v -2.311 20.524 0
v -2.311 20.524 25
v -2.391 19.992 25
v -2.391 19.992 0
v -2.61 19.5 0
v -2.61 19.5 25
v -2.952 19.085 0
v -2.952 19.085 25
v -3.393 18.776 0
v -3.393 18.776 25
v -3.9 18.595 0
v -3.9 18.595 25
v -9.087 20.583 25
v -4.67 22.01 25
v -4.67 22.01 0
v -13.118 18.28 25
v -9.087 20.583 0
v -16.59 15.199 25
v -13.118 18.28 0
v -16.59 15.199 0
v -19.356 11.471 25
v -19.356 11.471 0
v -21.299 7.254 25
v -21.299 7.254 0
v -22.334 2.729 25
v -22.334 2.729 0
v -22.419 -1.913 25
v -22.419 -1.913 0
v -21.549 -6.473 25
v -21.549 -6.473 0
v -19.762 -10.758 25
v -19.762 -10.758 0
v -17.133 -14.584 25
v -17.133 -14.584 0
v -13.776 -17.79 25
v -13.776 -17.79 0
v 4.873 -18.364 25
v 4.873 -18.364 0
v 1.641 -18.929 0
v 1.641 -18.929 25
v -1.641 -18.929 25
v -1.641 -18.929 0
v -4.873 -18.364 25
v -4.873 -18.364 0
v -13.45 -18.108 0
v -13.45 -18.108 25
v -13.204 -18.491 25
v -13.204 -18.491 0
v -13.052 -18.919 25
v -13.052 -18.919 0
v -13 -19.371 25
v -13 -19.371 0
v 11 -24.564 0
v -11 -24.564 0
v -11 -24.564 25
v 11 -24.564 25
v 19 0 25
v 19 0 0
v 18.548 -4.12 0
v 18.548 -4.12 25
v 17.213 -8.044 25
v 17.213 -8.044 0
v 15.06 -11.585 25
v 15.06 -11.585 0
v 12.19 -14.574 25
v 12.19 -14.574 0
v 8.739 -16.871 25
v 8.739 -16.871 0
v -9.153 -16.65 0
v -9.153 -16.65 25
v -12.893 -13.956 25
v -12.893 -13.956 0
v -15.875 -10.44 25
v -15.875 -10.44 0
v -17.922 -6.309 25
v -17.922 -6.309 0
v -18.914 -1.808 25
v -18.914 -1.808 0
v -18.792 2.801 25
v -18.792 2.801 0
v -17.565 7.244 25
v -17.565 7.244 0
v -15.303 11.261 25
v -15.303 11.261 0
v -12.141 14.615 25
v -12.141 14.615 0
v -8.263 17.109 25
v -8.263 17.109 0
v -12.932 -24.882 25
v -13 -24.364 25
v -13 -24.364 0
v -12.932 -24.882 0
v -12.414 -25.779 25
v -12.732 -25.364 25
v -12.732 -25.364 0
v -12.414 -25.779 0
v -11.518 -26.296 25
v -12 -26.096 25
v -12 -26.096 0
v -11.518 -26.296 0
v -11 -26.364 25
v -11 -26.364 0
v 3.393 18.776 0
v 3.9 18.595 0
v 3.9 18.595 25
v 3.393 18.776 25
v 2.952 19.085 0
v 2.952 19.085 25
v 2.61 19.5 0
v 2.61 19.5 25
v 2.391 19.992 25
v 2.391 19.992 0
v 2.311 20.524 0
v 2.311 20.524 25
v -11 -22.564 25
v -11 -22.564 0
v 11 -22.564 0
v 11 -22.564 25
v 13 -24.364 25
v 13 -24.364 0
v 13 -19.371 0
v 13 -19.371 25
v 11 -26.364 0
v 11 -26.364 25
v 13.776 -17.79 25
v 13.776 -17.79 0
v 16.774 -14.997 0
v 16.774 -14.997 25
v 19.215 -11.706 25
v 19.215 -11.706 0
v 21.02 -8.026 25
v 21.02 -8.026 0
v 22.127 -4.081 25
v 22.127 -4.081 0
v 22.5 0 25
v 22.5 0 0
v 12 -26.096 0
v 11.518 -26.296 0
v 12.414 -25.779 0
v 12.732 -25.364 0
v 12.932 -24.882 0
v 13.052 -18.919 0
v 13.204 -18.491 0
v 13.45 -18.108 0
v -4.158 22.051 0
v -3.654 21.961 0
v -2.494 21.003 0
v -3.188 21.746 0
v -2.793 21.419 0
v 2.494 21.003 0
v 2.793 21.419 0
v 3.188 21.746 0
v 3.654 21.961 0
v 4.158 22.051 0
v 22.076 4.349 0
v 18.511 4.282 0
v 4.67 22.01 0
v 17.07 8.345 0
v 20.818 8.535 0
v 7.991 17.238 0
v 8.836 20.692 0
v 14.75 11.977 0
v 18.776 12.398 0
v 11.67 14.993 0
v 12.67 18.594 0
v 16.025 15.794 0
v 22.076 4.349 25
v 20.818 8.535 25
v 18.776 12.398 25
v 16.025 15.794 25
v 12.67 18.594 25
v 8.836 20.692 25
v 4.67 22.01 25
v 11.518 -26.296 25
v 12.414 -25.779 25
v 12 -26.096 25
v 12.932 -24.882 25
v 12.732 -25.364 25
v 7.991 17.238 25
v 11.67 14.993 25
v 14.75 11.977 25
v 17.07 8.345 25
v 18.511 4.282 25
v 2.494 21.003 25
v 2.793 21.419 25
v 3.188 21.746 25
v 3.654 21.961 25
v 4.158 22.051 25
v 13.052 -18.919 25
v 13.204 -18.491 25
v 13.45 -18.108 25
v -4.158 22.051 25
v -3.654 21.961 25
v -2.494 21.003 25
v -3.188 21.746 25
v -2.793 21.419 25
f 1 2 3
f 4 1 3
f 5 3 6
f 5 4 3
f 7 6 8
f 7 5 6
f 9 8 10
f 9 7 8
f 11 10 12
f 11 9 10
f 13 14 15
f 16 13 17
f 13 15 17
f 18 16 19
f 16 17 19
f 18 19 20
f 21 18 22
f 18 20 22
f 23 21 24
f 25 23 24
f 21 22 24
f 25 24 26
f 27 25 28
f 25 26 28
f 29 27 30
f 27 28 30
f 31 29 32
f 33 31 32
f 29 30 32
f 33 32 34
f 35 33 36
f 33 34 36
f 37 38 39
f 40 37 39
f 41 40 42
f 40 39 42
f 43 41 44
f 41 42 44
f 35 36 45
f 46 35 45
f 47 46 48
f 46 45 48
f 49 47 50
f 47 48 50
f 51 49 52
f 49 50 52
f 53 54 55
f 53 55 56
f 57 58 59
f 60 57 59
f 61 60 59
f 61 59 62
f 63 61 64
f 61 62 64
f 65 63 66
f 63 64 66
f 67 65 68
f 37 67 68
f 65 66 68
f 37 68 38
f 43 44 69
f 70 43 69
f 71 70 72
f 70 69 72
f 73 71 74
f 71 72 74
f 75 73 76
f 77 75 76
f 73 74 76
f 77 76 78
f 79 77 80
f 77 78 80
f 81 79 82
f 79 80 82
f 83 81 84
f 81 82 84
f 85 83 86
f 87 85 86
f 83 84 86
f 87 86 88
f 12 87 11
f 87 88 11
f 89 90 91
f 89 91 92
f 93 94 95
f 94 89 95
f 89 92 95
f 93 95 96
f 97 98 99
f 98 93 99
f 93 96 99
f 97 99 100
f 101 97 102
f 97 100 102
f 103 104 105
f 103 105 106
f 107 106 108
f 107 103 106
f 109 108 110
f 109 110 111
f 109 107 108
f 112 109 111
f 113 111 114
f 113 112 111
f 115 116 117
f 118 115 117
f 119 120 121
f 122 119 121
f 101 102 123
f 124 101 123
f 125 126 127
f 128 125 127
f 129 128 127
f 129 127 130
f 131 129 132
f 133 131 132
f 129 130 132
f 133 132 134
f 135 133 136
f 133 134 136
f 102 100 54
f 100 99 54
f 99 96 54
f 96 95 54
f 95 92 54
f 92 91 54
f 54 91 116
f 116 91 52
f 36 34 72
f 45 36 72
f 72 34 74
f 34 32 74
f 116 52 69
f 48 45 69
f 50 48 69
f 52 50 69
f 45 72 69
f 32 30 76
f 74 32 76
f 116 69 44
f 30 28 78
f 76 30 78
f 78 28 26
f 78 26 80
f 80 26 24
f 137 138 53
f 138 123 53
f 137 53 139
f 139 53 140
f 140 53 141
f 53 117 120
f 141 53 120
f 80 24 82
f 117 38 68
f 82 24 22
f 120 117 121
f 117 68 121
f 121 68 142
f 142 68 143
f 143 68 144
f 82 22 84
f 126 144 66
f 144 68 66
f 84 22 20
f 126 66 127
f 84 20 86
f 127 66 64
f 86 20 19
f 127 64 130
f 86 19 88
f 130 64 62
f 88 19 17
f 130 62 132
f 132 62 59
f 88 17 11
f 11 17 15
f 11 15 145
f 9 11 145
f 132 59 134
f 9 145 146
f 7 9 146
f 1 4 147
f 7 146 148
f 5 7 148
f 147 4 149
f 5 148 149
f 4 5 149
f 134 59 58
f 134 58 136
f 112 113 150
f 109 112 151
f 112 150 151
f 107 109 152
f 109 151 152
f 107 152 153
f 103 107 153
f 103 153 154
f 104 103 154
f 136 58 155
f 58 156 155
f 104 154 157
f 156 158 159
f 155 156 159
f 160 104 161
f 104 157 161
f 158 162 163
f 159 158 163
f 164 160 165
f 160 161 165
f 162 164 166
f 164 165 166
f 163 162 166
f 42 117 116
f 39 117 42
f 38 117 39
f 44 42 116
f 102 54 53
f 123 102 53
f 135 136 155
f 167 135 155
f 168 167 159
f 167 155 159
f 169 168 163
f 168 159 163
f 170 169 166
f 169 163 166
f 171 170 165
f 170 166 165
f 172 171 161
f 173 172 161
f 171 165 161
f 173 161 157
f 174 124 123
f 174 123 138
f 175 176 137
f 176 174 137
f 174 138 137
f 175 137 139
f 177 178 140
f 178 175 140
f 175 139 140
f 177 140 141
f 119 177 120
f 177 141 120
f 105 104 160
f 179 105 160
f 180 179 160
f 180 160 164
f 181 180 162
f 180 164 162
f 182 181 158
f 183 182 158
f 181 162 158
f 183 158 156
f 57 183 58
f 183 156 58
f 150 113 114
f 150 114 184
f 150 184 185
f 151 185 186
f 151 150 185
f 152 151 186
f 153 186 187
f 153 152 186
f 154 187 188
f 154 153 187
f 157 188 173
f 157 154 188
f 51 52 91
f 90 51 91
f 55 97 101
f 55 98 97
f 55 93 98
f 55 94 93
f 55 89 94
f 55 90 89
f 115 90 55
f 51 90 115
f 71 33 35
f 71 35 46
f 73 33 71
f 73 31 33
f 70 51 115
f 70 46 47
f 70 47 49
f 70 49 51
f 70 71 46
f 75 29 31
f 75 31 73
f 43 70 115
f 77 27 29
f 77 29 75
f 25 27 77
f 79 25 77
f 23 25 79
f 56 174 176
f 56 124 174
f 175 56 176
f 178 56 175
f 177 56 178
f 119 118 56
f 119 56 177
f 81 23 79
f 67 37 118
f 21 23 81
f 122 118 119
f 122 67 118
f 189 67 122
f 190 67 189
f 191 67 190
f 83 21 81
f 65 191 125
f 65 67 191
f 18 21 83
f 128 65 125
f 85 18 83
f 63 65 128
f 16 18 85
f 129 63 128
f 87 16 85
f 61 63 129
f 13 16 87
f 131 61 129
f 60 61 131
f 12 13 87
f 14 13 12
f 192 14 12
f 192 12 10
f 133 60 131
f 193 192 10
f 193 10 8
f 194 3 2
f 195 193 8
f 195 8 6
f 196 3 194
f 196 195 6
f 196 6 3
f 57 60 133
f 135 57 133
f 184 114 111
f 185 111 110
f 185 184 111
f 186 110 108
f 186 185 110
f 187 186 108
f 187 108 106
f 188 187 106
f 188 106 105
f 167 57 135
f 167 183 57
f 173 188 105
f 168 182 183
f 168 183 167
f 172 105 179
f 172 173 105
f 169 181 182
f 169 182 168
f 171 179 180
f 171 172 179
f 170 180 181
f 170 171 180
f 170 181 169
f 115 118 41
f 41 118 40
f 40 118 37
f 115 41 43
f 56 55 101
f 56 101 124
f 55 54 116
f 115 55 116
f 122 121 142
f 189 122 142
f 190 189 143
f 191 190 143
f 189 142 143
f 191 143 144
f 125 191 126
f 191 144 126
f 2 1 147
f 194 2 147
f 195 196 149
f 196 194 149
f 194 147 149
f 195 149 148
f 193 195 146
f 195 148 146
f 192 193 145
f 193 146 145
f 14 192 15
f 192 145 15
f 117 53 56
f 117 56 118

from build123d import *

# Parameters (mm, degrees)
F0_W        = 22
F0_H        = 2
F1_DEPTH    = 25
F2_T1_DEPTH = 25
F2_T3_DEPTH = 35.98872287
F2_T5_DEPTH = 34.5227248018
F2_T7_DEPTH = 35


# Not quite as in the source:
# - a fillet or chamfer that OpenCascade refuses, or shapes differently, is made with other operations: its cross-section is extruded or revolved along the edge and cut away or added


with BuildPart() as f1:
    # F0 (on Top) → F1 (new body)
    with BuildSketch(Plane.XY):
        with BuildLine():
            ThreePointArc((-4.8733971724, -18.3643676722), (-18.9479647202, 1.4052163402), (-2.1111111111, 18.88235181))
            Line((-2.1111111111, 18.88235181), (-2.5, 22.360679775))
            ThreePointArc((-2.5, 22.360679775), (-21.7874934858, 5.6173950908), (-13, -18.3643676722))
            Line((-13, -18.3643676722), (-4.8733971724, -18.3643676722))
        make_face()
        with BuildLine():
            ThreePointArc((2.1111111111, 18.88235181), (14.1617638575, 12.6666666667), (19, 0))
            ThreePointArc((19, 0), (15.0597899434, -11.5845900602), (4.8733971724, -18.3643676722))
            Line((4.8733971724, -18.3643676722), (13, -18.3643676722))
            ThreePointArc((13, -18.3643676722), (19.9843688917, -10.3380365641), (22.5, 0))
            ThreePointArc((22.5, 0), (16.7705098312, 15), (2.5, 22.360679775))
            Line((2.5, 22.360679775), (2.1111111111, 18.88235181))
        make_face()
        with BuildLine():
            Line((13, -18.3643676722), (4.8733971724, -18.3643676722))
            ThreePointArc((4.8733971724, -18.3643676722), (0, -19), (-4.8733971724, -18.3643676722))
            Line((-4.8733971724, -18.3643676722), (-13, -18.3643676722))
            ThreePointArc((-13, -18.3643676722), (0, -22.5), (13, -18.3643676722))
        make_face()
        with BuildLine():
            Line((13, -26.3643676722), (13, -18.3643676722))
            ThreePointArc((13, -18.3643676722), (0, -22.5), (-13, -18.3643676722))
            Line((-13, -18.3643676722), (-13, -26.3643676722))
            Line((-13, -26.3643676722), (13, -26.3643676722))
        make_face()
        with Locations((0, -23.5643676722)):
            Rectangle(F0_W, F0_H, mode=Mode.SUBTRACT)
    extrude(amount=F1_DEPTH)

    # F2: fillet of radius 2 on 8 edges, made by hand

    # F2_s2 → F2_t1 (join)
    with BuildSketch(Plane.XY):
        with BuildLine():
            ThreePointArc((-13.7755102041, -17.79003425), (-13.2043135586, -18.490740056), (-13, -19.3713706278))
            Line((-13, -19.3713706278), (-13, -18.3643676722))
            ThreePointArc((-13, -18.3643676722), (-13.390834604, -18.0813591471), (-13.7755102041, -17.79003425))
        make_face()
        with BuildLine():
            ThreePointArc((13, -19.3713706278), (13.2043135586, -18.490740056), (13.7755102041, -17.79003425))
            ThreePointArc((13.7755102041, -17.79003425), (13.390834604, -18.0813591471), (13, -18.3643676722))
            Line((13, -18.3643676722), (13, -19.3713706278))
        make_face()
    extrude(amount=F2_T1_DEPTH)

    # F2_s4 → F2_t3 (cut)
    with BuildSketch(Plane.XY.offset(-5.494361435)):
        with BuildLine():
            ThreePointArc((-2.2669117515, 20.275875101), (-3.0840105352, 21.6753462818), (-4.6696036077, 22.0101068182))
            ThreePointArc((-4.6696036077, 22.0101068182), (-3.5890847472, 22.2118993037), (-2.5, 22.360679775))
            Line((-2.5, 22.360679775), (-2.2669117515, 20.275875101))
        make_face()
        with BuildLine():
            ThreePointArc((2.2669117515, 20.275875101), (3.0840105352, 21.6753462818), (4.6696036077, 22.0101068182))
            ThreePointArc((4.6696036077, 22.0101068182), (3.5890847472, 22.2118993037), (2.5, 22.360679775))
            Line((2.5, 22.360679775), (2.2669117515, 20.275875101))
        make_face()
    extrude(amount=F2_T3_DEPTH, mode=Mode.SUBTRACT)

    # F2_s6 → F2_t5 (cut)
    with BuildSketch(Plane.XY.offset(-4.7613624009)):
        with BuildLine():
            ThreePointArc((-2.3227272178, 20.7751038089), (-2.6900167457, 19.3804728744), (-3.8998343218, 18.5954642927))
            ThreePointArc((-3.8998343218, 18.5954642927), (-3.0088938767, 18.7602387415), (-2.1111111111, 18.88235181))
            Line((-2.1111111111, 18.88235181), (-2.3227272178, 20.7751038089))
        make_face()
        with BuildLine():
            ThreePointArc((3.8998343218, 18.5954642927), (2.6900167457, 19.3804728744), (2.3227272178, 20.7751038089))
            Line((2.3227272178, 20.7751038089), (2.1111111111, 18.88235181))
            ThreePointArc((2.1111111111, 18.88235181), (3.0088938767, 18.7602387415), (3.8998343218, 18.5954642927))
        make_face()
    extrude(amount=F2_T5_DEPTH, mode=Mode.SUBTRACT)

    # F2_s8 → F2_t7 (cut)
    with BuildSketch(Plane.XY.offset(-5)):
        with BuildLine():
            ThreePointArc((11, -26.3643676722), (12.4142135624, -25.7785812346), (13, -24.3643676722))
            Line((13, -24.3643676722), (13, -26.3643676722))
            Line((13, -26.3643676722), (11, -26.3643676722))
        make_face()
        with BuildLine():
            ThreePointArc((-13, -24.3643676722), (-12.4142135624, -25.7785812346), (-11, -26.3643676722))
            Line((-11, -26.3643676722), (-13, -26.3643676722))
            Line((-13, -26.3643676722), (-13, -24.3643676722))
        make_face()
    extrude(amount=F2_T7_DEPTH, mode=Mode.SUBTRACT)


solid = f1.part
